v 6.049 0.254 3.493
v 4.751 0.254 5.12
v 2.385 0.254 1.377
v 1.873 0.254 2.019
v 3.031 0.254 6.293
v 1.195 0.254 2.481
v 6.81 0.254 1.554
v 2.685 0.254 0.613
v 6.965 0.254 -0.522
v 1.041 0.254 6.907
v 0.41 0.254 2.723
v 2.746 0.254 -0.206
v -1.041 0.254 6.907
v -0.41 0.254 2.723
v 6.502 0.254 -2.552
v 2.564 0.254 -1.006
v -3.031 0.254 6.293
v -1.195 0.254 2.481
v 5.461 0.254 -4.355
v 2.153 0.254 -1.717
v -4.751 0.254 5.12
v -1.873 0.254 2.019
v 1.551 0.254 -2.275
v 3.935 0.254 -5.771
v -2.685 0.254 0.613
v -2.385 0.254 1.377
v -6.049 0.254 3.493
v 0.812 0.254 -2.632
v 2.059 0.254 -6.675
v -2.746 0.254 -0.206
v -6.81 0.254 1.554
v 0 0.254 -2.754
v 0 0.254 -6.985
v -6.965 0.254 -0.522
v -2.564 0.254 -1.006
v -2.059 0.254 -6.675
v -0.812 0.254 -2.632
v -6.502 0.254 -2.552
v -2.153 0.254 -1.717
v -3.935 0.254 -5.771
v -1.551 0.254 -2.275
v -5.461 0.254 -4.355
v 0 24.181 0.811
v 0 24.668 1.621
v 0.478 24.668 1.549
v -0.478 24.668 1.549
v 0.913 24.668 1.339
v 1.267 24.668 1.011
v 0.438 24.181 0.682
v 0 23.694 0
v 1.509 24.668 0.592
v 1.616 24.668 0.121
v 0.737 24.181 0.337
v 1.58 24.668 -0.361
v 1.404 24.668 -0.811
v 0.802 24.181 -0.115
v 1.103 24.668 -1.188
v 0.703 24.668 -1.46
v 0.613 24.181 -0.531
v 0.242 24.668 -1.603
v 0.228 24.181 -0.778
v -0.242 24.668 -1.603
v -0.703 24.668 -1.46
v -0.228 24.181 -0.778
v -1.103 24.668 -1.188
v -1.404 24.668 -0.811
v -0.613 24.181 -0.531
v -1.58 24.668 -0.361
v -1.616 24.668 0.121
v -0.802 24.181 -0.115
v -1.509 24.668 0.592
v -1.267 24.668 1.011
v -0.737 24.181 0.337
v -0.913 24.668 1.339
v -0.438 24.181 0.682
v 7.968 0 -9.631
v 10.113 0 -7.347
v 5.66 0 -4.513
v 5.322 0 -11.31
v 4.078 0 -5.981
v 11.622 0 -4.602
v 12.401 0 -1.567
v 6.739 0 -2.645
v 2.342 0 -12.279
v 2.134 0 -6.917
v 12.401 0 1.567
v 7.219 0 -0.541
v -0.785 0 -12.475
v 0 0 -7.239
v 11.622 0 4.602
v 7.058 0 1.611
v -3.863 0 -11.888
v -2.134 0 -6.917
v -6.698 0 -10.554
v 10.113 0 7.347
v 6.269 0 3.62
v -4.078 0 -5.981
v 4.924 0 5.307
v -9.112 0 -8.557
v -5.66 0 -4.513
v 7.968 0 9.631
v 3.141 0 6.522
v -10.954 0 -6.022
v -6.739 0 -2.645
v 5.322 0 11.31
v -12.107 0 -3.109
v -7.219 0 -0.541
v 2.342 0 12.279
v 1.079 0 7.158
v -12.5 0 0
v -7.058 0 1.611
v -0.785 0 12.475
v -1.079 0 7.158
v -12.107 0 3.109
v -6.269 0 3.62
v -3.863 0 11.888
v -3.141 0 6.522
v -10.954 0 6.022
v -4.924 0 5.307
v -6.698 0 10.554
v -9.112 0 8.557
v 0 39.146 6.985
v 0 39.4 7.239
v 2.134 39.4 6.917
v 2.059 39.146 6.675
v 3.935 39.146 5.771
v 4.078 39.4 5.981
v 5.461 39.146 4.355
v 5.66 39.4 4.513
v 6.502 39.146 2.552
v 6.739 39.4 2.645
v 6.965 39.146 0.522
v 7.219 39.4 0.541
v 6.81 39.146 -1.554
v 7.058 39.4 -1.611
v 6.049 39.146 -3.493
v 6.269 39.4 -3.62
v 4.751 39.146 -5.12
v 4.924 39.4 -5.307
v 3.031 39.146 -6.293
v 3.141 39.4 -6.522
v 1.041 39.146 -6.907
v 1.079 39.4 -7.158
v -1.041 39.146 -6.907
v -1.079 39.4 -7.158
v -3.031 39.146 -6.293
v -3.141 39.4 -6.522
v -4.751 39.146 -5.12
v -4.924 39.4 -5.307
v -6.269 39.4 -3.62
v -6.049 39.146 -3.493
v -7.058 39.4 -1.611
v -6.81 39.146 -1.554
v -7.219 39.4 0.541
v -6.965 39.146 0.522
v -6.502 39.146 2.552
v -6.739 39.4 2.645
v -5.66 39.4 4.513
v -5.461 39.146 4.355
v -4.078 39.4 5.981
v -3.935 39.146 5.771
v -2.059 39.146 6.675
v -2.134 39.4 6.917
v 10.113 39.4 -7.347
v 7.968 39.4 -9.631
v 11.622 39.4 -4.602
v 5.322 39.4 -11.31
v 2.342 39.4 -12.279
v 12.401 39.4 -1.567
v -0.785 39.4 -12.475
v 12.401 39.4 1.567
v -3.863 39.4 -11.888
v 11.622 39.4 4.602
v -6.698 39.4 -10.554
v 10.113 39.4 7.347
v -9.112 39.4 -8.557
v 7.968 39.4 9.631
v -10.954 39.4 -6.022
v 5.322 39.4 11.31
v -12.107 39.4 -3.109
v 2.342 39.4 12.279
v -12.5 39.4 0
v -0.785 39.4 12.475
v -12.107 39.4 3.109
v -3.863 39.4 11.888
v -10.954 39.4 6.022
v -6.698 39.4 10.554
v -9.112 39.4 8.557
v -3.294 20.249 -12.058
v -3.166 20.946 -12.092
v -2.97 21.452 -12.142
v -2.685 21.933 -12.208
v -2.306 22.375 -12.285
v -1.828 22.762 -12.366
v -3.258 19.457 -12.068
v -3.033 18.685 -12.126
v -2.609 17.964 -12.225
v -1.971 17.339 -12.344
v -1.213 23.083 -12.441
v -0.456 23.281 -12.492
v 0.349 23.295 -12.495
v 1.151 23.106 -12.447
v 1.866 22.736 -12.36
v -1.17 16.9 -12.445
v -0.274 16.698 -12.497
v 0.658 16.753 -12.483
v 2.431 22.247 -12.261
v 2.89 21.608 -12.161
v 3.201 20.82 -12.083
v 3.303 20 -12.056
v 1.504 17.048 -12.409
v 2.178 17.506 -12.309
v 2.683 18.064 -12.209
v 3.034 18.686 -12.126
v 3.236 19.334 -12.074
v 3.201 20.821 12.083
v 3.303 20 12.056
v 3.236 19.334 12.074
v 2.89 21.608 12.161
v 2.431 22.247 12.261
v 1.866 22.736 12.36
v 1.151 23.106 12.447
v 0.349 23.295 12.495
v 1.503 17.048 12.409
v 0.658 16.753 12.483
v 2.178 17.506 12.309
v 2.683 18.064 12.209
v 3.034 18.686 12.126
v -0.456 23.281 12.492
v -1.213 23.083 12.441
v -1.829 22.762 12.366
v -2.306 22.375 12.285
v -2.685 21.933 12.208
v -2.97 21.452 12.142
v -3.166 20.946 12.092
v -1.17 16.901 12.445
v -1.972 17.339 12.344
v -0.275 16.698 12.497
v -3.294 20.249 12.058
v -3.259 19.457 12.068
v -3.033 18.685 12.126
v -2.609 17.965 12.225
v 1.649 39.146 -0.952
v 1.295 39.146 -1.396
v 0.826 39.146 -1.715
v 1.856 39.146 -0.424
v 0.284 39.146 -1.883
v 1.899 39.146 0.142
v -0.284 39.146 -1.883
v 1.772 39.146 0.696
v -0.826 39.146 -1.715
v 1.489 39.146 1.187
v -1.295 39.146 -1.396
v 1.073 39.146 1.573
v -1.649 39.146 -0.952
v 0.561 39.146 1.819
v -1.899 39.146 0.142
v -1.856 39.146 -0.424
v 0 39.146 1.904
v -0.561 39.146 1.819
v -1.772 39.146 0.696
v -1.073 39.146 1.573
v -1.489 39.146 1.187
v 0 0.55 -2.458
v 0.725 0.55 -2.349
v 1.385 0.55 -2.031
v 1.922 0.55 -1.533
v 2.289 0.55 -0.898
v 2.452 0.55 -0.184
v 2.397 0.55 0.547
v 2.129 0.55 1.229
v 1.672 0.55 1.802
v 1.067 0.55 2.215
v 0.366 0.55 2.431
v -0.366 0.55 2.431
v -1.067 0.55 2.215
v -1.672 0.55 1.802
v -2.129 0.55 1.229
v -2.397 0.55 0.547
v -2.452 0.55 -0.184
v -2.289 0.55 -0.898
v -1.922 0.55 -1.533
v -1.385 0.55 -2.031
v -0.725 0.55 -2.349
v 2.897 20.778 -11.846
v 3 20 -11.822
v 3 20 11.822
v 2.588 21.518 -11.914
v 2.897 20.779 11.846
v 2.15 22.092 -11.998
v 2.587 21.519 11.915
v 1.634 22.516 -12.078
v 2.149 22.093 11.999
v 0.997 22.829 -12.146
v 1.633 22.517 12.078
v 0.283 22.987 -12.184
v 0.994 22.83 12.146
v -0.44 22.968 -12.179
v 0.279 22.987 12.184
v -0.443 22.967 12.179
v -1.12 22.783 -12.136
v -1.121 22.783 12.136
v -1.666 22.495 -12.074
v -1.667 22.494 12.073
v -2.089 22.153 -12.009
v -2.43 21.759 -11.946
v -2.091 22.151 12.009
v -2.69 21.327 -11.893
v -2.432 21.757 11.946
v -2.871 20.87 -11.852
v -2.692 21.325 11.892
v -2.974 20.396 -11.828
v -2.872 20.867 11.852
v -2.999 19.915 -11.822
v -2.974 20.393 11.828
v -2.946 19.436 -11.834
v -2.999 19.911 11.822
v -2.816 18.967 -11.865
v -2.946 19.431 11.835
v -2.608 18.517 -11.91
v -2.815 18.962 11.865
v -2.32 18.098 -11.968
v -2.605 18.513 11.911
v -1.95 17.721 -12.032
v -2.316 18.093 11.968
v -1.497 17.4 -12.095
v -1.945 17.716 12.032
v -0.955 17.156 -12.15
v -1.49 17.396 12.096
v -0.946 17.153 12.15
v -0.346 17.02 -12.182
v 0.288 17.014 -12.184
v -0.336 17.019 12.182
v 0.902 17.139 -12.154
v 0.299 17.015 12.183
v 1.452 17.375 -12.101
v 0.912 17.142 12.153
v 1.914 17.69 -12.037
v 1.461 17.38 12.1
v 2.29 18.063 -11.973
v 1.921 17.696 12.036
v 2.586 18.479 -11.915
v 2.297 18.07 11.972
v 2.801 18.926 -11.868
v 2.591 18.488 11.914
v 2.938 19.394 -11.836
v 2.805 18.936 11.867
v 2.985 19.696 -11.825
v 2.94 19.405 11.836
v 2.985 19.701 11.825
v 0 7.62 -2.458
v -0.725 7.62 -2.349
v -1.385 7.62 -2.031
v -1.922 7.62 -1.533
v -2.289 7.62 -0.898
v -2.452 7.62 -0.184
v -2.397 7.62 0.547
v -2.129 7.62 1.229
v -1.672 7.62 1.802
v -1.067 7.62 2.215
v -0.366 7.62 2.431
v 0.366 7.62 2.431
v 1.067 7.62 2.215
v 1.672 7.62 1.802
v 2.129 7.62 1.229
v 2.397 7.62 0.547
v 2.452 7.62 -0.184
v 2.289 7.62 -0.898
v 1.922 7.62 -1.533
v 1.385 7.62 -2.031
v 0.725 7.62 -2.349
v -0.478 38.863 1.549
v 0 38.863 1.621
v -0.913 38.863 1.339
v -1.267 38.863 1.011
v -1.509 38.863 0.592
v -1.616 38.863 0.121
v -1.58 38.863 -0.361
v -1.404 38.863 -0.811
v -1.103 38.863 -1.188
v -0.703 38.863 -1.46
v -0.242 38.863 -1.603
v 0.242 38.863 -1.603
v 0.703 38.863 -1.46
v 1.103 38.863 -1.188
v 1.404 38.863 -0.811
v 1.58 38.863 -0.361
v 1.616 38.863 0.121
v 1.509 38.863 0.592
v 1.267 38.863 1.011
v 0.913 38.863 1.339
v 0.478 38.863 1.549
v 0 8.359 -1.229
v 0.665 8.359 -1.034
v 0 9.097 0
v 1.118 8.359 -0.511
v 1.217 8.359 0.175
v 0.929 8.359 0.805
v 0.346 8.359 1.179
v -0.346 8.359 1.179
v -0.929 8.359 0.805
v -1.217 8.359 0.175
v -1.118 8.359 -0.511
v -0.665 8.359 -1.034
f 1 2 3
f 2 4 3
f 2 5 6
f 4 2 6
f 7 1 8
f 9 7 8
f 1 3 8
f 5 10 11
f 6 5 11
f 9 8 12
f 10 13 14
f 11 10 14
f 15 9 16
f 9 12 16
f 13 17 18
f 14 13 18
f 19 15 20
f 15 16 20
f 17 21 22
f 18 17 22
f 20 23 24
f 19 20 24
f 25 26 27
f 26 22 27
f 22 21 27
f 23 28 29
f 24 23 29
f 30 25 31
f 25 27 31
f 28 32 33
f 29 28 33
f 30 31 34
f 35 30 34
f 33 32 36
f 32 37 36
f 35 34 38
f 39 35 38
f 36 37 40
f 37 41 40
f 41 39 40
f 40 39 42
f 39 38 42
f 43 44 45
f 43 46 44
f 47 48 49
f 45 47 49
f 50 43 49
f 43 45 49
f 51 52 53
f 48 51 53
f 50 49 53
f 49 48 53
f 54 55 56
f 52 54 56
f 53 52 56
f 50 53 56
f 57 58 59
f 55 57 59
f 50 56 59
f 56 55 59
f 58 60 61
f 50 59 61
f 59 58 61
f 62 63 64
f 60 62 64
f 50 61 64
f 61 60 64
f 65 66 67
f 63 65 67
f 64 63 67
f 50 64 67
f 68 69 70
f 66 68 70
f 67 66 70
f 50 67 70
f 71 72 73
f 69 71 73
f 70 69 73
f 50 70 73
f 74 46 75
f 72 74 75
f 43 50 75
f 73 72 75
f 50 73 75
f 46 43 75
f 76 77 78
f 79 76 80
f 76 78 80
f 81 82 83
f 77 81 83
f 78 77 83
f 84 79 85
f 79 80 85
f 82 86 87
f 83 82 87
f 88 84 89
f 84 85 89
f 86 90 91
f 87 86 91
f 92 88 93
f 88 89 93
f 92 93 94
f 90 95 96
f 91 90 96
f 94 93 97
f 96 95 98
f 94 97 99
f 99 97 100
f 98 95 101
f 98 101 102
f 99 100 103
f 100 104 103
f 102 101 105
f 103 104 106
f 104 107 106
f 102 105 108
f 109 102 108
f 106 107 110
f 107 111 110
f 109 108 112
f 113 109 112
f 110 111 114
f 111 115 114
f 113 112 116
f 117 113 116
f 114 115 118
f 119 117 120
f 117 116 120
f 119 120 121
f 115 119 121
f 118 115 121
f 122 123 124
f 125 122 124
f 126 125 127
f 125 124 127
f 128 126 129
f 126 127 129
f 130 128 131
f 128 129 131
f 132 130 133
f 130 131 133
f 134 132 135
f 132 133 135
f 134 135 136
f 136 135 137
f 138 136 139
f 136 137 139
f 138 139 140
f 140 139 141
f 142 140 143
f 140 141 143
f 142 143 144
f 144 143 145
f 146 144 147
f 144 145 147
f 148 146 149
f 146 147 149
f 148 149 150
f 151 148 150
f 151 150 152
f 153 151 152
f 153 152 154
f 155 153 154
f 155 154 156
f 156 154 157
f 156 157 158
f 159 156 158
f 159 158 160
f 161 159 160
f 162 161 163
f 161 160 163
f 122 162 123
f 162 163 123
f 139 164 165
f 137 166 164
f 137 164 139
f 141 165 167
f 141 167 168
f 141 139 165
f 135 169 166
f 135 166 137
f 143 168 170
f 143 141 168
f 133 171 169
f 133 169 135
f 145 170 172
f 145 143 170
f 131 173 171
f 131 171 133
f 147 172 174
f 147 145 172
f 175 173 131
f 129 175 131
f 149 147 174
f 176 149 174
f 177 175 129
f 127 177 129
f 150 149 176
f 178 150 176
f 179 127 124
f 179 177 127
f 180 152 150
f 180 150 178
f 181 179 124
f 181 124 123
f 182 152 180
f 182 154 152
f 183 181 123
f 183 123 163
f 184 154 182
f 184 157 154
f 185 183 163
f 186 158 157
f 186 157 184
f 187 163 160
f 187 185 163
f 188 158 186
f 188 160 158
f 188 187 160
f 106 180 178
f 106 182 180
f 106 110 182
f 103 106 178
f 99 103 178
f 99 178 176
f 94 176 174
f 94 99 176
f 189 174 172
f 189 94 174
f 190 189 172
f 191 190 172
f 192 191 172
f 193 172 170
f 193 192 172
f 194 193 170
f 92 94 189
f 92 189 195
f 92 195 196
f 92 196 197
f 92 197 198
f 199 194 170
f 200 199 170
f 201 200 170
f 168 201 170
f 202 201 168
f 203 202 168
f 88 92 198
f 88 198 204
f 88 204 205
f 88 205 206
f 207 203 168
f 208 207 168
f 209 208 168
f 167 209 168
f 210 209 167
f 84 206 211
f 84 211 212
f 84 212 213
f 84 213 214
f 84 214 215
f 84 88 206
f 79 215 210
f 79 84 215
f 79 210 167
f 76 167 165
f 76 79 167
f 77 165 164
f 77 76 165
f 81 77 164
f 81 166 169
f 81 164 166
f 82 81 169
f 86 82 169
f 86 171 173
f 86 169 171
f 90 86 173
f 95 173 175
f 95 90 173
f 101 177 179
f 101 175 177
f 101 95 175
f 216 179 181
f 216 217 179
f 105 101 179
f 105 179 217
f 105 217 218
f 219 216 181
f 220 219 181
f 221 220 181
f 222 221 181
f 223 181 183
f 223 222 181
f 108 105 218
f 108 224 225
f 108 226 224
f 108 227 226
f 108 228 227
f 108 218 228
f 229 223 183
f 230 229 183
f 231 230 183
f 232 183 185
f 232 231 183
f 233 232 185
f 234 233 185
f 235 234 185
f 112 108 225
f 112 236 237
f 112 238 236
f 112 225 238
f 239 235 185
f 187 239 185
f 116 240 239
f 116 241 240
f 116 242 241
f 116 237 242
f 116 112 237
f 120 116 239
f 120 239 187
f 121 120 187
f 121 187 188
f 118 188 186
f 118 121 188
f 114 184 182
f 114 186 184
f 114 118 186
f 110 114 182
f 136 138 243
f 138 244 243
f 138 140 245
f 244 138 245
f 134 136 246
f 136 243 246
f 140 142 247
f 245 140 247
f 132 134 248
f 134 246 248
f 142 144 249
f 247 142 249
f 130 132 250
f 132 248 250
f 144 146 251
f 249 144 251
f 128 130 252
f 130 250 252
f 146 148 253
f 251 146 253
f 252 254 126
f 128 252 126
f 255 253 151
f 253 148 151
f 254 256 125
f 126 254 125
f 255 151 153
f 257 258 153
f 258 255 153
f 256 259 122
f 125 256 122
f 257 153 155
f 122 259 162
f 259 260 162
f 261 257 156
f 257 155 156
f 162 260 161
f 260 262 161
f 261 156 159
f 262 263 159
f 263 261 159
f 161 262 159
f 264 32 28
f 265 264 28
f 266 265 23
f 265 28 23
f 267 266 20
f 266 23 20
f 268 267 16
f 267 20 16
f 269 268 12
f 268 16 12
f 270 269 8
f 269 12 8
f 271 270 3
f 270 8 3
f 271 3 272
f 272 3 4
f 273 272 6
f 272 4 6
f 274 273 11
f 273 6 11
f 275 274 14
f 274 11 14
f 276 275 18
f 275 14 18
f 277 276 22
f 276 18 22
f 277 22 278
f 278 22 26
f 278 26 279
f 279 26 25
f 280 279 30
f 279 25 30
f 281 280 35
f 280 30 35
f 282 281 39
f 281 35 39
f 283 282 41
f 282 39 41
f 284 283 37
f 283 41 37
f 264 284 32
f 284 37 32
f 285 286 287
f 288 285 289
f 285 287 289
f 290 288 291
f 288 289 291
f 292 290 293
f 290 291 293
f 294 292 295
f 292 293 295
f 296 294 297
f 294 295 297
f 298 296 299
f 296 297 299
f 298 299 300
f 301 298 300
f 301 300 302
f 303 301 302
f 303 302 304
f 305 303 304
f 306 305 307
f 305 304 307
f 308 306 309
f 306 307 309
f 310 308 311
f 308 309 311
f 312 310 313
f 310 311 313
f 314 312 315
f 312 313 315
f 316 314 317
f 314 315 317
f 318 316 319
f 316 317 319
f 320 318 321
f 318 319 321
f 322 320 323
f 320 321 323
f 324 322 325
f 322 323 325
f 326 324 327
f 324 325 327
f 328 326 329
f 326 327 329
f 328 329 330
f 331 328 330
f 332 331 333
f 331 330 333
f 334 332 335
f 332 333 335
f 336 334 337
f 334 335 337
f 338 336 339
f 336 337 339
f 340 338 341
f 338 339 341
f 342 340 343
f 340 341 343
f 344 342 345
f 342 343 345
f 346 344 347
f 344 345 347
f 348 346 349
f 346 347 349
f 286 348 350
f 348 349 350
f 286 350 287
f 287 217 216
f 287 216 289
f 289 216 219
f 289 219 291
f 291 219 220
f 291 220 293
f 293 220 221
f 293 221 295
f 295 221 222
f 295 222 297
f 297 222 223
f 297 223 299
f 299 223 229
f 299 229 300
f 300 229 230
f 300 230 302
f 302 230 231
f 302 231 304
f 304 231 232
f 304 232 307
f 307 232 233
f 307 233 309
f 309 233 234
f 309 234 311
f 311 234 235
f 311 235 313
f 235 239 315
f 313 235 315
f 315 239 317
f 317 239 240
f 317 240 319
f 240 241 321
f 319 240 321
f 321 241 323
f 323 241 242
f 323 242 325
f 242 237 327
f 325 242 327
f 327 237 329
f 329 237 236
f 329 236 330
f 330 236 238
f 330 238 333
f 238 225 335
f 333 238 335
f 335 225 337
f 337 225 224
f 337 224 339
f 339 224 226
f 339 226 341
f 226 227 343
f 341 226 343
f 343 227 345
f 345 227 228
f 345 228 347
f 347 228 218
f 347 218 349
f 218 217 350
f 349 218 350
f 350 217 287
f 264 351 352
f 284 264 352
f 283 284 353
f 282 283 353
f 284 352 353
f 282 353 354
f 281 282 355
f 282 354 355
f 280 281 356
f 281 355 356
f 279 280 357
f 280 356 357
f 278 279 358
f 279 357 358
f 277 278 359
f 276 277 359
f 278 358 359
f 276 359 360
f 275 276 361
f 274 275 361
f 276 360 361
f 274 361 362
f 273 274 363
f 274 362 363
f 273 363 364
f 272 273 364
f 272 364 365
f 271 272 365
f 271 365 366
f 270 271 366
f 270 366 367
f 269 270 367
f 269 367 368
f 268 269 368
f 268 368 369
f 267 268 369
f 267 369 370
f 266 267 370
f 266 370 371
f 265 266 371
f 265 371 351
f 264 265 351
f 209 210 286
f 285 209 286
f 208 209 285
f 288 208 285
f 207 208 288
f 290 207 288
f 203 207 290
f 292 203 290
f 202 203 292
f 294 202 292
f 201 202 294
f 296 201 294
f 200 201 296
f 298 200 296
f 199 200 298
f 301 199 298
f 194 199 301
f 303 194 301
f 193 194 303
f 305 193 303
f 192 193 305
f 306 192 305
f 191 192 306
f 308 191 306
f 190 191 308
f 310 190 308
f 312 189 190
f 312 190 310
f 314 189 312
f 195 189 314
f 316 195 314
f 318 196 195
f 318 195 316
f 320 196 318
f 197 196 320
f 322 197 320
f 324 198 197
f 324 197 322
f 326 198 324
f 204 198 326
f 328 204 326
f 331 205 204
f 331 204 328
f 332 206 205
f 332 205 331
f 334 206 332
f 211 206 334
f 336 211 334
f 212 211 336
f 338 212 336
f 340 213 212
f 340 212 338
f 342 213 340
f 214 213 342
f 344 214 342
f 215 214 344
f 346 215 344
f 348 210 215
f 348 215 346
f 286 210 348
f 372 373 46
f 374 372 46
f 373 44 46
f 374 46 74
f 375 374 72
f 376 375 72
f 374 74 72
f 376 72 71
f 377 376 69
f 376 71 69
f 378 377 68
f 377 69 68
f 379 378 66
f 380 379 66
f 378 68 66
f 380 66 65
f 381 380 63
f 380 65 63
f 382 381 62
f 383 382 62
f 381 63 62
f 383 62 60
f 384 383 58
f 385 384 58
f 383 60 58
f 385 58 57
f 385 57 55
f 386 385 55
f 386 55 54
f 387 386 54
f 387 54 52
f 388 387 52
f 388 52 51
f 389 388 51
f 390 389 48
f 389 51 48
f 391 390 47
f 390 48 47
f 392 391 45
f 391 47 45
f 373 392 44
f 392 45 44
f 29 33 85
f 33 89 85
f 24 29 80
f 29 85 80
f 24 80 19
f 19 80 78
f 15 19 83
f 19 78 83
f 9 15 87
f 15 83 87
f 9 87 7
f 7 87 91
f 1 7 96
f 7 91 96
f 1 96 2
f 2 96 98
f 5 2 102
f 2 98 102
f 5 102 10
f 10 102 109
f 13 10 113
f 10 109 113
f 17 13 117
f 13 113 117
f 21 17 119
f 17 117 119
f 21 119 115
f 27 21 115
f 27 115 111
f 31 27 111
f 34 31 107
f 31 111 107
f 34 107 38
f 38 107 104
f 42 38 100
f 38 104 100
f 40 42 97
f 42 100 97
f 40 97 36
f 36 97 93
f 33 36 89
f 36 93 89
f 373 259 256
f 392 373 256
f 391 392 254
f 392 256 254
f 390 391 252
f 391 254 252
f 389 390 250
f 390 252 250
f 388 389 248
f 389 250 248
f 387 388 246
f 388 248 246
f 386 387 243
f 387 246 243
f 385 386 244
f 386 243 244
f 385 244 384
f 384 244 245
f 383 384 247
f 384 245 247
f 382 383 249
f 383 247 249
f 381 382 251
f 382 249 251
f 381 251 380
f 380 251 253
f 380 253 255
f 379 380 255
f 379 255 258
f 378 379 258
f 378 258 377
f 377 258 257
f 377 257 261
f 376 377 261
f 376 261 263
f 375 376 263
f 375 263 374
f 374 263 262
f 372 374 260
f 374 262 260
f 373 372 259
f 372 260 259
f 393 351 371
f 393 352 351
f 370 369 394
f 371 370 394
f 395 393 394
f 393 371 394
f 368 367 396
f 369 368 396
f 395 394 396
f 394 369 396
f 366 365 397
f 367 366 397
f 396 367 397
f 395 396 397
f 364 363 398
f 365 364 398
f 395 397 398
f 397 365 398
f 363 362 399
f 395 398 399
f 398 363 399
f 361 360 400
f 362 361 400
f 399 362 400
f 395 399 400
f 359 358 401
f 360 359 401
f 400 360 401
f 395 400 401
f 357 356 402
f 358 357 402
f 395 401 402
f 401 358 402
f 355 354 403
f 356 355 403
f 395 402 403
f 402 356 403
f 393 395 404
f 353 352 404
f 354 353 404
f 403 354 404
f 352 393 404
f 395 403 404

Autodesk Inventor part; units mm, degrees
ref_plane "YZ Plane" through (0, 0, 0) normal (1, 0, 0) x (0, 1, 0)
ref_plane "XZ Plane" through (0, 0, 0) normal (0, 1, 0) x (-1, 0, 0)
ref_plane "XY Plane" through (0, 0, 0) normal (0, 0, 1) x (1, 0, 0)
sketch "Sketch1" plane through (0, 0, 0) normal (0, 1, 0) x (-1, 0, 0)
  circle A0 centre (0, 0) radius 12.5
  dimension "d0" = 25
extrude "Extrusion1" add sketch "Sketch1" along normal blind 39.4
hole "ReliefTop" at (0, 39.4, 0) direction (0, -1, 0) diameter 13.97 depth 0.254 countersink diameter 14.478 countersink angle 90
hole "ReliefBottom" at (0, 0, 0) direction (0, 1, 0) diameter 13.97 depth 0.254 countersink diameter 14.478 countersink angle 90
hole "MountBottomM6" at (0, 0.254, 0) direction (0, 1, 0) diameter 4.917 depth 7.366 tip angle 118 countersink diameter 5.508 countersink angle 90 thread size "M6x1" class "6H" standard "ISO Metric profile"
hole "MountTopM4" at (0, 39.146, 0) direction (0, -1, 0) diameter 3.242 depth 14.478 tip angle 118 countersink diameter 3.808 countersink angle 90 thread size "M4x0.7" class "6H" standard "ISO Metric profile"
sketch "Sketch2" plane through (0, 0, 0) normal (0, 0, 1) x (1, 0, 0)
  circle A0 centre (0, 20) radius 3
  line L0 (-12.5, 0) -> (12.5, 0) projected
  line L1 (0, -4.6) -> (0, 27.6) projected
  point P0 (0, 0)
  dimension "d49" = 6
  dimension "d50" = 20
extrude "Extrusion2" cut sketch "Sketch2" along normal through all both and the other way through all
chamfer "Chamfer1" distance 0.313 angle 45 2 edges at (-3, 19.9998, 12.1347) (-3, 19.9998, -12.1347)
equation "\"d1\" = height"
equation "\"d5\" = reliefMinor"
equation "\"d7\" = reliefMajor"
equation "\"d10\" = reliefDepth"
equation "\"d14\" = reliefMinor"
equation "\"d16\" = reliefMajor"
equation "\"d19\" = reliefDepth"
equation "\"d25\" = chamferM6"
equation "\"d28\" = depthM6"
equation "\"d40\" = chamferM4"
equation "\"d43\" = depthM4"
equation "\"reliefDepth\" = 0.254"
equation "\"reliefMinor\" = 13.97"
equation "\"reliefMajor\" = 14.478"
equation "\"chamferM6\" = 5.508"
equation "\"chamferM4\" = 3.808"
equation "\"depthM6\" = 7.366"
equation "\"depthM4\" = 14.478"
equation "\"height\" = 39.4"
properties part number "PLS-P642H0394A00_M" material "Stainless Steel"
